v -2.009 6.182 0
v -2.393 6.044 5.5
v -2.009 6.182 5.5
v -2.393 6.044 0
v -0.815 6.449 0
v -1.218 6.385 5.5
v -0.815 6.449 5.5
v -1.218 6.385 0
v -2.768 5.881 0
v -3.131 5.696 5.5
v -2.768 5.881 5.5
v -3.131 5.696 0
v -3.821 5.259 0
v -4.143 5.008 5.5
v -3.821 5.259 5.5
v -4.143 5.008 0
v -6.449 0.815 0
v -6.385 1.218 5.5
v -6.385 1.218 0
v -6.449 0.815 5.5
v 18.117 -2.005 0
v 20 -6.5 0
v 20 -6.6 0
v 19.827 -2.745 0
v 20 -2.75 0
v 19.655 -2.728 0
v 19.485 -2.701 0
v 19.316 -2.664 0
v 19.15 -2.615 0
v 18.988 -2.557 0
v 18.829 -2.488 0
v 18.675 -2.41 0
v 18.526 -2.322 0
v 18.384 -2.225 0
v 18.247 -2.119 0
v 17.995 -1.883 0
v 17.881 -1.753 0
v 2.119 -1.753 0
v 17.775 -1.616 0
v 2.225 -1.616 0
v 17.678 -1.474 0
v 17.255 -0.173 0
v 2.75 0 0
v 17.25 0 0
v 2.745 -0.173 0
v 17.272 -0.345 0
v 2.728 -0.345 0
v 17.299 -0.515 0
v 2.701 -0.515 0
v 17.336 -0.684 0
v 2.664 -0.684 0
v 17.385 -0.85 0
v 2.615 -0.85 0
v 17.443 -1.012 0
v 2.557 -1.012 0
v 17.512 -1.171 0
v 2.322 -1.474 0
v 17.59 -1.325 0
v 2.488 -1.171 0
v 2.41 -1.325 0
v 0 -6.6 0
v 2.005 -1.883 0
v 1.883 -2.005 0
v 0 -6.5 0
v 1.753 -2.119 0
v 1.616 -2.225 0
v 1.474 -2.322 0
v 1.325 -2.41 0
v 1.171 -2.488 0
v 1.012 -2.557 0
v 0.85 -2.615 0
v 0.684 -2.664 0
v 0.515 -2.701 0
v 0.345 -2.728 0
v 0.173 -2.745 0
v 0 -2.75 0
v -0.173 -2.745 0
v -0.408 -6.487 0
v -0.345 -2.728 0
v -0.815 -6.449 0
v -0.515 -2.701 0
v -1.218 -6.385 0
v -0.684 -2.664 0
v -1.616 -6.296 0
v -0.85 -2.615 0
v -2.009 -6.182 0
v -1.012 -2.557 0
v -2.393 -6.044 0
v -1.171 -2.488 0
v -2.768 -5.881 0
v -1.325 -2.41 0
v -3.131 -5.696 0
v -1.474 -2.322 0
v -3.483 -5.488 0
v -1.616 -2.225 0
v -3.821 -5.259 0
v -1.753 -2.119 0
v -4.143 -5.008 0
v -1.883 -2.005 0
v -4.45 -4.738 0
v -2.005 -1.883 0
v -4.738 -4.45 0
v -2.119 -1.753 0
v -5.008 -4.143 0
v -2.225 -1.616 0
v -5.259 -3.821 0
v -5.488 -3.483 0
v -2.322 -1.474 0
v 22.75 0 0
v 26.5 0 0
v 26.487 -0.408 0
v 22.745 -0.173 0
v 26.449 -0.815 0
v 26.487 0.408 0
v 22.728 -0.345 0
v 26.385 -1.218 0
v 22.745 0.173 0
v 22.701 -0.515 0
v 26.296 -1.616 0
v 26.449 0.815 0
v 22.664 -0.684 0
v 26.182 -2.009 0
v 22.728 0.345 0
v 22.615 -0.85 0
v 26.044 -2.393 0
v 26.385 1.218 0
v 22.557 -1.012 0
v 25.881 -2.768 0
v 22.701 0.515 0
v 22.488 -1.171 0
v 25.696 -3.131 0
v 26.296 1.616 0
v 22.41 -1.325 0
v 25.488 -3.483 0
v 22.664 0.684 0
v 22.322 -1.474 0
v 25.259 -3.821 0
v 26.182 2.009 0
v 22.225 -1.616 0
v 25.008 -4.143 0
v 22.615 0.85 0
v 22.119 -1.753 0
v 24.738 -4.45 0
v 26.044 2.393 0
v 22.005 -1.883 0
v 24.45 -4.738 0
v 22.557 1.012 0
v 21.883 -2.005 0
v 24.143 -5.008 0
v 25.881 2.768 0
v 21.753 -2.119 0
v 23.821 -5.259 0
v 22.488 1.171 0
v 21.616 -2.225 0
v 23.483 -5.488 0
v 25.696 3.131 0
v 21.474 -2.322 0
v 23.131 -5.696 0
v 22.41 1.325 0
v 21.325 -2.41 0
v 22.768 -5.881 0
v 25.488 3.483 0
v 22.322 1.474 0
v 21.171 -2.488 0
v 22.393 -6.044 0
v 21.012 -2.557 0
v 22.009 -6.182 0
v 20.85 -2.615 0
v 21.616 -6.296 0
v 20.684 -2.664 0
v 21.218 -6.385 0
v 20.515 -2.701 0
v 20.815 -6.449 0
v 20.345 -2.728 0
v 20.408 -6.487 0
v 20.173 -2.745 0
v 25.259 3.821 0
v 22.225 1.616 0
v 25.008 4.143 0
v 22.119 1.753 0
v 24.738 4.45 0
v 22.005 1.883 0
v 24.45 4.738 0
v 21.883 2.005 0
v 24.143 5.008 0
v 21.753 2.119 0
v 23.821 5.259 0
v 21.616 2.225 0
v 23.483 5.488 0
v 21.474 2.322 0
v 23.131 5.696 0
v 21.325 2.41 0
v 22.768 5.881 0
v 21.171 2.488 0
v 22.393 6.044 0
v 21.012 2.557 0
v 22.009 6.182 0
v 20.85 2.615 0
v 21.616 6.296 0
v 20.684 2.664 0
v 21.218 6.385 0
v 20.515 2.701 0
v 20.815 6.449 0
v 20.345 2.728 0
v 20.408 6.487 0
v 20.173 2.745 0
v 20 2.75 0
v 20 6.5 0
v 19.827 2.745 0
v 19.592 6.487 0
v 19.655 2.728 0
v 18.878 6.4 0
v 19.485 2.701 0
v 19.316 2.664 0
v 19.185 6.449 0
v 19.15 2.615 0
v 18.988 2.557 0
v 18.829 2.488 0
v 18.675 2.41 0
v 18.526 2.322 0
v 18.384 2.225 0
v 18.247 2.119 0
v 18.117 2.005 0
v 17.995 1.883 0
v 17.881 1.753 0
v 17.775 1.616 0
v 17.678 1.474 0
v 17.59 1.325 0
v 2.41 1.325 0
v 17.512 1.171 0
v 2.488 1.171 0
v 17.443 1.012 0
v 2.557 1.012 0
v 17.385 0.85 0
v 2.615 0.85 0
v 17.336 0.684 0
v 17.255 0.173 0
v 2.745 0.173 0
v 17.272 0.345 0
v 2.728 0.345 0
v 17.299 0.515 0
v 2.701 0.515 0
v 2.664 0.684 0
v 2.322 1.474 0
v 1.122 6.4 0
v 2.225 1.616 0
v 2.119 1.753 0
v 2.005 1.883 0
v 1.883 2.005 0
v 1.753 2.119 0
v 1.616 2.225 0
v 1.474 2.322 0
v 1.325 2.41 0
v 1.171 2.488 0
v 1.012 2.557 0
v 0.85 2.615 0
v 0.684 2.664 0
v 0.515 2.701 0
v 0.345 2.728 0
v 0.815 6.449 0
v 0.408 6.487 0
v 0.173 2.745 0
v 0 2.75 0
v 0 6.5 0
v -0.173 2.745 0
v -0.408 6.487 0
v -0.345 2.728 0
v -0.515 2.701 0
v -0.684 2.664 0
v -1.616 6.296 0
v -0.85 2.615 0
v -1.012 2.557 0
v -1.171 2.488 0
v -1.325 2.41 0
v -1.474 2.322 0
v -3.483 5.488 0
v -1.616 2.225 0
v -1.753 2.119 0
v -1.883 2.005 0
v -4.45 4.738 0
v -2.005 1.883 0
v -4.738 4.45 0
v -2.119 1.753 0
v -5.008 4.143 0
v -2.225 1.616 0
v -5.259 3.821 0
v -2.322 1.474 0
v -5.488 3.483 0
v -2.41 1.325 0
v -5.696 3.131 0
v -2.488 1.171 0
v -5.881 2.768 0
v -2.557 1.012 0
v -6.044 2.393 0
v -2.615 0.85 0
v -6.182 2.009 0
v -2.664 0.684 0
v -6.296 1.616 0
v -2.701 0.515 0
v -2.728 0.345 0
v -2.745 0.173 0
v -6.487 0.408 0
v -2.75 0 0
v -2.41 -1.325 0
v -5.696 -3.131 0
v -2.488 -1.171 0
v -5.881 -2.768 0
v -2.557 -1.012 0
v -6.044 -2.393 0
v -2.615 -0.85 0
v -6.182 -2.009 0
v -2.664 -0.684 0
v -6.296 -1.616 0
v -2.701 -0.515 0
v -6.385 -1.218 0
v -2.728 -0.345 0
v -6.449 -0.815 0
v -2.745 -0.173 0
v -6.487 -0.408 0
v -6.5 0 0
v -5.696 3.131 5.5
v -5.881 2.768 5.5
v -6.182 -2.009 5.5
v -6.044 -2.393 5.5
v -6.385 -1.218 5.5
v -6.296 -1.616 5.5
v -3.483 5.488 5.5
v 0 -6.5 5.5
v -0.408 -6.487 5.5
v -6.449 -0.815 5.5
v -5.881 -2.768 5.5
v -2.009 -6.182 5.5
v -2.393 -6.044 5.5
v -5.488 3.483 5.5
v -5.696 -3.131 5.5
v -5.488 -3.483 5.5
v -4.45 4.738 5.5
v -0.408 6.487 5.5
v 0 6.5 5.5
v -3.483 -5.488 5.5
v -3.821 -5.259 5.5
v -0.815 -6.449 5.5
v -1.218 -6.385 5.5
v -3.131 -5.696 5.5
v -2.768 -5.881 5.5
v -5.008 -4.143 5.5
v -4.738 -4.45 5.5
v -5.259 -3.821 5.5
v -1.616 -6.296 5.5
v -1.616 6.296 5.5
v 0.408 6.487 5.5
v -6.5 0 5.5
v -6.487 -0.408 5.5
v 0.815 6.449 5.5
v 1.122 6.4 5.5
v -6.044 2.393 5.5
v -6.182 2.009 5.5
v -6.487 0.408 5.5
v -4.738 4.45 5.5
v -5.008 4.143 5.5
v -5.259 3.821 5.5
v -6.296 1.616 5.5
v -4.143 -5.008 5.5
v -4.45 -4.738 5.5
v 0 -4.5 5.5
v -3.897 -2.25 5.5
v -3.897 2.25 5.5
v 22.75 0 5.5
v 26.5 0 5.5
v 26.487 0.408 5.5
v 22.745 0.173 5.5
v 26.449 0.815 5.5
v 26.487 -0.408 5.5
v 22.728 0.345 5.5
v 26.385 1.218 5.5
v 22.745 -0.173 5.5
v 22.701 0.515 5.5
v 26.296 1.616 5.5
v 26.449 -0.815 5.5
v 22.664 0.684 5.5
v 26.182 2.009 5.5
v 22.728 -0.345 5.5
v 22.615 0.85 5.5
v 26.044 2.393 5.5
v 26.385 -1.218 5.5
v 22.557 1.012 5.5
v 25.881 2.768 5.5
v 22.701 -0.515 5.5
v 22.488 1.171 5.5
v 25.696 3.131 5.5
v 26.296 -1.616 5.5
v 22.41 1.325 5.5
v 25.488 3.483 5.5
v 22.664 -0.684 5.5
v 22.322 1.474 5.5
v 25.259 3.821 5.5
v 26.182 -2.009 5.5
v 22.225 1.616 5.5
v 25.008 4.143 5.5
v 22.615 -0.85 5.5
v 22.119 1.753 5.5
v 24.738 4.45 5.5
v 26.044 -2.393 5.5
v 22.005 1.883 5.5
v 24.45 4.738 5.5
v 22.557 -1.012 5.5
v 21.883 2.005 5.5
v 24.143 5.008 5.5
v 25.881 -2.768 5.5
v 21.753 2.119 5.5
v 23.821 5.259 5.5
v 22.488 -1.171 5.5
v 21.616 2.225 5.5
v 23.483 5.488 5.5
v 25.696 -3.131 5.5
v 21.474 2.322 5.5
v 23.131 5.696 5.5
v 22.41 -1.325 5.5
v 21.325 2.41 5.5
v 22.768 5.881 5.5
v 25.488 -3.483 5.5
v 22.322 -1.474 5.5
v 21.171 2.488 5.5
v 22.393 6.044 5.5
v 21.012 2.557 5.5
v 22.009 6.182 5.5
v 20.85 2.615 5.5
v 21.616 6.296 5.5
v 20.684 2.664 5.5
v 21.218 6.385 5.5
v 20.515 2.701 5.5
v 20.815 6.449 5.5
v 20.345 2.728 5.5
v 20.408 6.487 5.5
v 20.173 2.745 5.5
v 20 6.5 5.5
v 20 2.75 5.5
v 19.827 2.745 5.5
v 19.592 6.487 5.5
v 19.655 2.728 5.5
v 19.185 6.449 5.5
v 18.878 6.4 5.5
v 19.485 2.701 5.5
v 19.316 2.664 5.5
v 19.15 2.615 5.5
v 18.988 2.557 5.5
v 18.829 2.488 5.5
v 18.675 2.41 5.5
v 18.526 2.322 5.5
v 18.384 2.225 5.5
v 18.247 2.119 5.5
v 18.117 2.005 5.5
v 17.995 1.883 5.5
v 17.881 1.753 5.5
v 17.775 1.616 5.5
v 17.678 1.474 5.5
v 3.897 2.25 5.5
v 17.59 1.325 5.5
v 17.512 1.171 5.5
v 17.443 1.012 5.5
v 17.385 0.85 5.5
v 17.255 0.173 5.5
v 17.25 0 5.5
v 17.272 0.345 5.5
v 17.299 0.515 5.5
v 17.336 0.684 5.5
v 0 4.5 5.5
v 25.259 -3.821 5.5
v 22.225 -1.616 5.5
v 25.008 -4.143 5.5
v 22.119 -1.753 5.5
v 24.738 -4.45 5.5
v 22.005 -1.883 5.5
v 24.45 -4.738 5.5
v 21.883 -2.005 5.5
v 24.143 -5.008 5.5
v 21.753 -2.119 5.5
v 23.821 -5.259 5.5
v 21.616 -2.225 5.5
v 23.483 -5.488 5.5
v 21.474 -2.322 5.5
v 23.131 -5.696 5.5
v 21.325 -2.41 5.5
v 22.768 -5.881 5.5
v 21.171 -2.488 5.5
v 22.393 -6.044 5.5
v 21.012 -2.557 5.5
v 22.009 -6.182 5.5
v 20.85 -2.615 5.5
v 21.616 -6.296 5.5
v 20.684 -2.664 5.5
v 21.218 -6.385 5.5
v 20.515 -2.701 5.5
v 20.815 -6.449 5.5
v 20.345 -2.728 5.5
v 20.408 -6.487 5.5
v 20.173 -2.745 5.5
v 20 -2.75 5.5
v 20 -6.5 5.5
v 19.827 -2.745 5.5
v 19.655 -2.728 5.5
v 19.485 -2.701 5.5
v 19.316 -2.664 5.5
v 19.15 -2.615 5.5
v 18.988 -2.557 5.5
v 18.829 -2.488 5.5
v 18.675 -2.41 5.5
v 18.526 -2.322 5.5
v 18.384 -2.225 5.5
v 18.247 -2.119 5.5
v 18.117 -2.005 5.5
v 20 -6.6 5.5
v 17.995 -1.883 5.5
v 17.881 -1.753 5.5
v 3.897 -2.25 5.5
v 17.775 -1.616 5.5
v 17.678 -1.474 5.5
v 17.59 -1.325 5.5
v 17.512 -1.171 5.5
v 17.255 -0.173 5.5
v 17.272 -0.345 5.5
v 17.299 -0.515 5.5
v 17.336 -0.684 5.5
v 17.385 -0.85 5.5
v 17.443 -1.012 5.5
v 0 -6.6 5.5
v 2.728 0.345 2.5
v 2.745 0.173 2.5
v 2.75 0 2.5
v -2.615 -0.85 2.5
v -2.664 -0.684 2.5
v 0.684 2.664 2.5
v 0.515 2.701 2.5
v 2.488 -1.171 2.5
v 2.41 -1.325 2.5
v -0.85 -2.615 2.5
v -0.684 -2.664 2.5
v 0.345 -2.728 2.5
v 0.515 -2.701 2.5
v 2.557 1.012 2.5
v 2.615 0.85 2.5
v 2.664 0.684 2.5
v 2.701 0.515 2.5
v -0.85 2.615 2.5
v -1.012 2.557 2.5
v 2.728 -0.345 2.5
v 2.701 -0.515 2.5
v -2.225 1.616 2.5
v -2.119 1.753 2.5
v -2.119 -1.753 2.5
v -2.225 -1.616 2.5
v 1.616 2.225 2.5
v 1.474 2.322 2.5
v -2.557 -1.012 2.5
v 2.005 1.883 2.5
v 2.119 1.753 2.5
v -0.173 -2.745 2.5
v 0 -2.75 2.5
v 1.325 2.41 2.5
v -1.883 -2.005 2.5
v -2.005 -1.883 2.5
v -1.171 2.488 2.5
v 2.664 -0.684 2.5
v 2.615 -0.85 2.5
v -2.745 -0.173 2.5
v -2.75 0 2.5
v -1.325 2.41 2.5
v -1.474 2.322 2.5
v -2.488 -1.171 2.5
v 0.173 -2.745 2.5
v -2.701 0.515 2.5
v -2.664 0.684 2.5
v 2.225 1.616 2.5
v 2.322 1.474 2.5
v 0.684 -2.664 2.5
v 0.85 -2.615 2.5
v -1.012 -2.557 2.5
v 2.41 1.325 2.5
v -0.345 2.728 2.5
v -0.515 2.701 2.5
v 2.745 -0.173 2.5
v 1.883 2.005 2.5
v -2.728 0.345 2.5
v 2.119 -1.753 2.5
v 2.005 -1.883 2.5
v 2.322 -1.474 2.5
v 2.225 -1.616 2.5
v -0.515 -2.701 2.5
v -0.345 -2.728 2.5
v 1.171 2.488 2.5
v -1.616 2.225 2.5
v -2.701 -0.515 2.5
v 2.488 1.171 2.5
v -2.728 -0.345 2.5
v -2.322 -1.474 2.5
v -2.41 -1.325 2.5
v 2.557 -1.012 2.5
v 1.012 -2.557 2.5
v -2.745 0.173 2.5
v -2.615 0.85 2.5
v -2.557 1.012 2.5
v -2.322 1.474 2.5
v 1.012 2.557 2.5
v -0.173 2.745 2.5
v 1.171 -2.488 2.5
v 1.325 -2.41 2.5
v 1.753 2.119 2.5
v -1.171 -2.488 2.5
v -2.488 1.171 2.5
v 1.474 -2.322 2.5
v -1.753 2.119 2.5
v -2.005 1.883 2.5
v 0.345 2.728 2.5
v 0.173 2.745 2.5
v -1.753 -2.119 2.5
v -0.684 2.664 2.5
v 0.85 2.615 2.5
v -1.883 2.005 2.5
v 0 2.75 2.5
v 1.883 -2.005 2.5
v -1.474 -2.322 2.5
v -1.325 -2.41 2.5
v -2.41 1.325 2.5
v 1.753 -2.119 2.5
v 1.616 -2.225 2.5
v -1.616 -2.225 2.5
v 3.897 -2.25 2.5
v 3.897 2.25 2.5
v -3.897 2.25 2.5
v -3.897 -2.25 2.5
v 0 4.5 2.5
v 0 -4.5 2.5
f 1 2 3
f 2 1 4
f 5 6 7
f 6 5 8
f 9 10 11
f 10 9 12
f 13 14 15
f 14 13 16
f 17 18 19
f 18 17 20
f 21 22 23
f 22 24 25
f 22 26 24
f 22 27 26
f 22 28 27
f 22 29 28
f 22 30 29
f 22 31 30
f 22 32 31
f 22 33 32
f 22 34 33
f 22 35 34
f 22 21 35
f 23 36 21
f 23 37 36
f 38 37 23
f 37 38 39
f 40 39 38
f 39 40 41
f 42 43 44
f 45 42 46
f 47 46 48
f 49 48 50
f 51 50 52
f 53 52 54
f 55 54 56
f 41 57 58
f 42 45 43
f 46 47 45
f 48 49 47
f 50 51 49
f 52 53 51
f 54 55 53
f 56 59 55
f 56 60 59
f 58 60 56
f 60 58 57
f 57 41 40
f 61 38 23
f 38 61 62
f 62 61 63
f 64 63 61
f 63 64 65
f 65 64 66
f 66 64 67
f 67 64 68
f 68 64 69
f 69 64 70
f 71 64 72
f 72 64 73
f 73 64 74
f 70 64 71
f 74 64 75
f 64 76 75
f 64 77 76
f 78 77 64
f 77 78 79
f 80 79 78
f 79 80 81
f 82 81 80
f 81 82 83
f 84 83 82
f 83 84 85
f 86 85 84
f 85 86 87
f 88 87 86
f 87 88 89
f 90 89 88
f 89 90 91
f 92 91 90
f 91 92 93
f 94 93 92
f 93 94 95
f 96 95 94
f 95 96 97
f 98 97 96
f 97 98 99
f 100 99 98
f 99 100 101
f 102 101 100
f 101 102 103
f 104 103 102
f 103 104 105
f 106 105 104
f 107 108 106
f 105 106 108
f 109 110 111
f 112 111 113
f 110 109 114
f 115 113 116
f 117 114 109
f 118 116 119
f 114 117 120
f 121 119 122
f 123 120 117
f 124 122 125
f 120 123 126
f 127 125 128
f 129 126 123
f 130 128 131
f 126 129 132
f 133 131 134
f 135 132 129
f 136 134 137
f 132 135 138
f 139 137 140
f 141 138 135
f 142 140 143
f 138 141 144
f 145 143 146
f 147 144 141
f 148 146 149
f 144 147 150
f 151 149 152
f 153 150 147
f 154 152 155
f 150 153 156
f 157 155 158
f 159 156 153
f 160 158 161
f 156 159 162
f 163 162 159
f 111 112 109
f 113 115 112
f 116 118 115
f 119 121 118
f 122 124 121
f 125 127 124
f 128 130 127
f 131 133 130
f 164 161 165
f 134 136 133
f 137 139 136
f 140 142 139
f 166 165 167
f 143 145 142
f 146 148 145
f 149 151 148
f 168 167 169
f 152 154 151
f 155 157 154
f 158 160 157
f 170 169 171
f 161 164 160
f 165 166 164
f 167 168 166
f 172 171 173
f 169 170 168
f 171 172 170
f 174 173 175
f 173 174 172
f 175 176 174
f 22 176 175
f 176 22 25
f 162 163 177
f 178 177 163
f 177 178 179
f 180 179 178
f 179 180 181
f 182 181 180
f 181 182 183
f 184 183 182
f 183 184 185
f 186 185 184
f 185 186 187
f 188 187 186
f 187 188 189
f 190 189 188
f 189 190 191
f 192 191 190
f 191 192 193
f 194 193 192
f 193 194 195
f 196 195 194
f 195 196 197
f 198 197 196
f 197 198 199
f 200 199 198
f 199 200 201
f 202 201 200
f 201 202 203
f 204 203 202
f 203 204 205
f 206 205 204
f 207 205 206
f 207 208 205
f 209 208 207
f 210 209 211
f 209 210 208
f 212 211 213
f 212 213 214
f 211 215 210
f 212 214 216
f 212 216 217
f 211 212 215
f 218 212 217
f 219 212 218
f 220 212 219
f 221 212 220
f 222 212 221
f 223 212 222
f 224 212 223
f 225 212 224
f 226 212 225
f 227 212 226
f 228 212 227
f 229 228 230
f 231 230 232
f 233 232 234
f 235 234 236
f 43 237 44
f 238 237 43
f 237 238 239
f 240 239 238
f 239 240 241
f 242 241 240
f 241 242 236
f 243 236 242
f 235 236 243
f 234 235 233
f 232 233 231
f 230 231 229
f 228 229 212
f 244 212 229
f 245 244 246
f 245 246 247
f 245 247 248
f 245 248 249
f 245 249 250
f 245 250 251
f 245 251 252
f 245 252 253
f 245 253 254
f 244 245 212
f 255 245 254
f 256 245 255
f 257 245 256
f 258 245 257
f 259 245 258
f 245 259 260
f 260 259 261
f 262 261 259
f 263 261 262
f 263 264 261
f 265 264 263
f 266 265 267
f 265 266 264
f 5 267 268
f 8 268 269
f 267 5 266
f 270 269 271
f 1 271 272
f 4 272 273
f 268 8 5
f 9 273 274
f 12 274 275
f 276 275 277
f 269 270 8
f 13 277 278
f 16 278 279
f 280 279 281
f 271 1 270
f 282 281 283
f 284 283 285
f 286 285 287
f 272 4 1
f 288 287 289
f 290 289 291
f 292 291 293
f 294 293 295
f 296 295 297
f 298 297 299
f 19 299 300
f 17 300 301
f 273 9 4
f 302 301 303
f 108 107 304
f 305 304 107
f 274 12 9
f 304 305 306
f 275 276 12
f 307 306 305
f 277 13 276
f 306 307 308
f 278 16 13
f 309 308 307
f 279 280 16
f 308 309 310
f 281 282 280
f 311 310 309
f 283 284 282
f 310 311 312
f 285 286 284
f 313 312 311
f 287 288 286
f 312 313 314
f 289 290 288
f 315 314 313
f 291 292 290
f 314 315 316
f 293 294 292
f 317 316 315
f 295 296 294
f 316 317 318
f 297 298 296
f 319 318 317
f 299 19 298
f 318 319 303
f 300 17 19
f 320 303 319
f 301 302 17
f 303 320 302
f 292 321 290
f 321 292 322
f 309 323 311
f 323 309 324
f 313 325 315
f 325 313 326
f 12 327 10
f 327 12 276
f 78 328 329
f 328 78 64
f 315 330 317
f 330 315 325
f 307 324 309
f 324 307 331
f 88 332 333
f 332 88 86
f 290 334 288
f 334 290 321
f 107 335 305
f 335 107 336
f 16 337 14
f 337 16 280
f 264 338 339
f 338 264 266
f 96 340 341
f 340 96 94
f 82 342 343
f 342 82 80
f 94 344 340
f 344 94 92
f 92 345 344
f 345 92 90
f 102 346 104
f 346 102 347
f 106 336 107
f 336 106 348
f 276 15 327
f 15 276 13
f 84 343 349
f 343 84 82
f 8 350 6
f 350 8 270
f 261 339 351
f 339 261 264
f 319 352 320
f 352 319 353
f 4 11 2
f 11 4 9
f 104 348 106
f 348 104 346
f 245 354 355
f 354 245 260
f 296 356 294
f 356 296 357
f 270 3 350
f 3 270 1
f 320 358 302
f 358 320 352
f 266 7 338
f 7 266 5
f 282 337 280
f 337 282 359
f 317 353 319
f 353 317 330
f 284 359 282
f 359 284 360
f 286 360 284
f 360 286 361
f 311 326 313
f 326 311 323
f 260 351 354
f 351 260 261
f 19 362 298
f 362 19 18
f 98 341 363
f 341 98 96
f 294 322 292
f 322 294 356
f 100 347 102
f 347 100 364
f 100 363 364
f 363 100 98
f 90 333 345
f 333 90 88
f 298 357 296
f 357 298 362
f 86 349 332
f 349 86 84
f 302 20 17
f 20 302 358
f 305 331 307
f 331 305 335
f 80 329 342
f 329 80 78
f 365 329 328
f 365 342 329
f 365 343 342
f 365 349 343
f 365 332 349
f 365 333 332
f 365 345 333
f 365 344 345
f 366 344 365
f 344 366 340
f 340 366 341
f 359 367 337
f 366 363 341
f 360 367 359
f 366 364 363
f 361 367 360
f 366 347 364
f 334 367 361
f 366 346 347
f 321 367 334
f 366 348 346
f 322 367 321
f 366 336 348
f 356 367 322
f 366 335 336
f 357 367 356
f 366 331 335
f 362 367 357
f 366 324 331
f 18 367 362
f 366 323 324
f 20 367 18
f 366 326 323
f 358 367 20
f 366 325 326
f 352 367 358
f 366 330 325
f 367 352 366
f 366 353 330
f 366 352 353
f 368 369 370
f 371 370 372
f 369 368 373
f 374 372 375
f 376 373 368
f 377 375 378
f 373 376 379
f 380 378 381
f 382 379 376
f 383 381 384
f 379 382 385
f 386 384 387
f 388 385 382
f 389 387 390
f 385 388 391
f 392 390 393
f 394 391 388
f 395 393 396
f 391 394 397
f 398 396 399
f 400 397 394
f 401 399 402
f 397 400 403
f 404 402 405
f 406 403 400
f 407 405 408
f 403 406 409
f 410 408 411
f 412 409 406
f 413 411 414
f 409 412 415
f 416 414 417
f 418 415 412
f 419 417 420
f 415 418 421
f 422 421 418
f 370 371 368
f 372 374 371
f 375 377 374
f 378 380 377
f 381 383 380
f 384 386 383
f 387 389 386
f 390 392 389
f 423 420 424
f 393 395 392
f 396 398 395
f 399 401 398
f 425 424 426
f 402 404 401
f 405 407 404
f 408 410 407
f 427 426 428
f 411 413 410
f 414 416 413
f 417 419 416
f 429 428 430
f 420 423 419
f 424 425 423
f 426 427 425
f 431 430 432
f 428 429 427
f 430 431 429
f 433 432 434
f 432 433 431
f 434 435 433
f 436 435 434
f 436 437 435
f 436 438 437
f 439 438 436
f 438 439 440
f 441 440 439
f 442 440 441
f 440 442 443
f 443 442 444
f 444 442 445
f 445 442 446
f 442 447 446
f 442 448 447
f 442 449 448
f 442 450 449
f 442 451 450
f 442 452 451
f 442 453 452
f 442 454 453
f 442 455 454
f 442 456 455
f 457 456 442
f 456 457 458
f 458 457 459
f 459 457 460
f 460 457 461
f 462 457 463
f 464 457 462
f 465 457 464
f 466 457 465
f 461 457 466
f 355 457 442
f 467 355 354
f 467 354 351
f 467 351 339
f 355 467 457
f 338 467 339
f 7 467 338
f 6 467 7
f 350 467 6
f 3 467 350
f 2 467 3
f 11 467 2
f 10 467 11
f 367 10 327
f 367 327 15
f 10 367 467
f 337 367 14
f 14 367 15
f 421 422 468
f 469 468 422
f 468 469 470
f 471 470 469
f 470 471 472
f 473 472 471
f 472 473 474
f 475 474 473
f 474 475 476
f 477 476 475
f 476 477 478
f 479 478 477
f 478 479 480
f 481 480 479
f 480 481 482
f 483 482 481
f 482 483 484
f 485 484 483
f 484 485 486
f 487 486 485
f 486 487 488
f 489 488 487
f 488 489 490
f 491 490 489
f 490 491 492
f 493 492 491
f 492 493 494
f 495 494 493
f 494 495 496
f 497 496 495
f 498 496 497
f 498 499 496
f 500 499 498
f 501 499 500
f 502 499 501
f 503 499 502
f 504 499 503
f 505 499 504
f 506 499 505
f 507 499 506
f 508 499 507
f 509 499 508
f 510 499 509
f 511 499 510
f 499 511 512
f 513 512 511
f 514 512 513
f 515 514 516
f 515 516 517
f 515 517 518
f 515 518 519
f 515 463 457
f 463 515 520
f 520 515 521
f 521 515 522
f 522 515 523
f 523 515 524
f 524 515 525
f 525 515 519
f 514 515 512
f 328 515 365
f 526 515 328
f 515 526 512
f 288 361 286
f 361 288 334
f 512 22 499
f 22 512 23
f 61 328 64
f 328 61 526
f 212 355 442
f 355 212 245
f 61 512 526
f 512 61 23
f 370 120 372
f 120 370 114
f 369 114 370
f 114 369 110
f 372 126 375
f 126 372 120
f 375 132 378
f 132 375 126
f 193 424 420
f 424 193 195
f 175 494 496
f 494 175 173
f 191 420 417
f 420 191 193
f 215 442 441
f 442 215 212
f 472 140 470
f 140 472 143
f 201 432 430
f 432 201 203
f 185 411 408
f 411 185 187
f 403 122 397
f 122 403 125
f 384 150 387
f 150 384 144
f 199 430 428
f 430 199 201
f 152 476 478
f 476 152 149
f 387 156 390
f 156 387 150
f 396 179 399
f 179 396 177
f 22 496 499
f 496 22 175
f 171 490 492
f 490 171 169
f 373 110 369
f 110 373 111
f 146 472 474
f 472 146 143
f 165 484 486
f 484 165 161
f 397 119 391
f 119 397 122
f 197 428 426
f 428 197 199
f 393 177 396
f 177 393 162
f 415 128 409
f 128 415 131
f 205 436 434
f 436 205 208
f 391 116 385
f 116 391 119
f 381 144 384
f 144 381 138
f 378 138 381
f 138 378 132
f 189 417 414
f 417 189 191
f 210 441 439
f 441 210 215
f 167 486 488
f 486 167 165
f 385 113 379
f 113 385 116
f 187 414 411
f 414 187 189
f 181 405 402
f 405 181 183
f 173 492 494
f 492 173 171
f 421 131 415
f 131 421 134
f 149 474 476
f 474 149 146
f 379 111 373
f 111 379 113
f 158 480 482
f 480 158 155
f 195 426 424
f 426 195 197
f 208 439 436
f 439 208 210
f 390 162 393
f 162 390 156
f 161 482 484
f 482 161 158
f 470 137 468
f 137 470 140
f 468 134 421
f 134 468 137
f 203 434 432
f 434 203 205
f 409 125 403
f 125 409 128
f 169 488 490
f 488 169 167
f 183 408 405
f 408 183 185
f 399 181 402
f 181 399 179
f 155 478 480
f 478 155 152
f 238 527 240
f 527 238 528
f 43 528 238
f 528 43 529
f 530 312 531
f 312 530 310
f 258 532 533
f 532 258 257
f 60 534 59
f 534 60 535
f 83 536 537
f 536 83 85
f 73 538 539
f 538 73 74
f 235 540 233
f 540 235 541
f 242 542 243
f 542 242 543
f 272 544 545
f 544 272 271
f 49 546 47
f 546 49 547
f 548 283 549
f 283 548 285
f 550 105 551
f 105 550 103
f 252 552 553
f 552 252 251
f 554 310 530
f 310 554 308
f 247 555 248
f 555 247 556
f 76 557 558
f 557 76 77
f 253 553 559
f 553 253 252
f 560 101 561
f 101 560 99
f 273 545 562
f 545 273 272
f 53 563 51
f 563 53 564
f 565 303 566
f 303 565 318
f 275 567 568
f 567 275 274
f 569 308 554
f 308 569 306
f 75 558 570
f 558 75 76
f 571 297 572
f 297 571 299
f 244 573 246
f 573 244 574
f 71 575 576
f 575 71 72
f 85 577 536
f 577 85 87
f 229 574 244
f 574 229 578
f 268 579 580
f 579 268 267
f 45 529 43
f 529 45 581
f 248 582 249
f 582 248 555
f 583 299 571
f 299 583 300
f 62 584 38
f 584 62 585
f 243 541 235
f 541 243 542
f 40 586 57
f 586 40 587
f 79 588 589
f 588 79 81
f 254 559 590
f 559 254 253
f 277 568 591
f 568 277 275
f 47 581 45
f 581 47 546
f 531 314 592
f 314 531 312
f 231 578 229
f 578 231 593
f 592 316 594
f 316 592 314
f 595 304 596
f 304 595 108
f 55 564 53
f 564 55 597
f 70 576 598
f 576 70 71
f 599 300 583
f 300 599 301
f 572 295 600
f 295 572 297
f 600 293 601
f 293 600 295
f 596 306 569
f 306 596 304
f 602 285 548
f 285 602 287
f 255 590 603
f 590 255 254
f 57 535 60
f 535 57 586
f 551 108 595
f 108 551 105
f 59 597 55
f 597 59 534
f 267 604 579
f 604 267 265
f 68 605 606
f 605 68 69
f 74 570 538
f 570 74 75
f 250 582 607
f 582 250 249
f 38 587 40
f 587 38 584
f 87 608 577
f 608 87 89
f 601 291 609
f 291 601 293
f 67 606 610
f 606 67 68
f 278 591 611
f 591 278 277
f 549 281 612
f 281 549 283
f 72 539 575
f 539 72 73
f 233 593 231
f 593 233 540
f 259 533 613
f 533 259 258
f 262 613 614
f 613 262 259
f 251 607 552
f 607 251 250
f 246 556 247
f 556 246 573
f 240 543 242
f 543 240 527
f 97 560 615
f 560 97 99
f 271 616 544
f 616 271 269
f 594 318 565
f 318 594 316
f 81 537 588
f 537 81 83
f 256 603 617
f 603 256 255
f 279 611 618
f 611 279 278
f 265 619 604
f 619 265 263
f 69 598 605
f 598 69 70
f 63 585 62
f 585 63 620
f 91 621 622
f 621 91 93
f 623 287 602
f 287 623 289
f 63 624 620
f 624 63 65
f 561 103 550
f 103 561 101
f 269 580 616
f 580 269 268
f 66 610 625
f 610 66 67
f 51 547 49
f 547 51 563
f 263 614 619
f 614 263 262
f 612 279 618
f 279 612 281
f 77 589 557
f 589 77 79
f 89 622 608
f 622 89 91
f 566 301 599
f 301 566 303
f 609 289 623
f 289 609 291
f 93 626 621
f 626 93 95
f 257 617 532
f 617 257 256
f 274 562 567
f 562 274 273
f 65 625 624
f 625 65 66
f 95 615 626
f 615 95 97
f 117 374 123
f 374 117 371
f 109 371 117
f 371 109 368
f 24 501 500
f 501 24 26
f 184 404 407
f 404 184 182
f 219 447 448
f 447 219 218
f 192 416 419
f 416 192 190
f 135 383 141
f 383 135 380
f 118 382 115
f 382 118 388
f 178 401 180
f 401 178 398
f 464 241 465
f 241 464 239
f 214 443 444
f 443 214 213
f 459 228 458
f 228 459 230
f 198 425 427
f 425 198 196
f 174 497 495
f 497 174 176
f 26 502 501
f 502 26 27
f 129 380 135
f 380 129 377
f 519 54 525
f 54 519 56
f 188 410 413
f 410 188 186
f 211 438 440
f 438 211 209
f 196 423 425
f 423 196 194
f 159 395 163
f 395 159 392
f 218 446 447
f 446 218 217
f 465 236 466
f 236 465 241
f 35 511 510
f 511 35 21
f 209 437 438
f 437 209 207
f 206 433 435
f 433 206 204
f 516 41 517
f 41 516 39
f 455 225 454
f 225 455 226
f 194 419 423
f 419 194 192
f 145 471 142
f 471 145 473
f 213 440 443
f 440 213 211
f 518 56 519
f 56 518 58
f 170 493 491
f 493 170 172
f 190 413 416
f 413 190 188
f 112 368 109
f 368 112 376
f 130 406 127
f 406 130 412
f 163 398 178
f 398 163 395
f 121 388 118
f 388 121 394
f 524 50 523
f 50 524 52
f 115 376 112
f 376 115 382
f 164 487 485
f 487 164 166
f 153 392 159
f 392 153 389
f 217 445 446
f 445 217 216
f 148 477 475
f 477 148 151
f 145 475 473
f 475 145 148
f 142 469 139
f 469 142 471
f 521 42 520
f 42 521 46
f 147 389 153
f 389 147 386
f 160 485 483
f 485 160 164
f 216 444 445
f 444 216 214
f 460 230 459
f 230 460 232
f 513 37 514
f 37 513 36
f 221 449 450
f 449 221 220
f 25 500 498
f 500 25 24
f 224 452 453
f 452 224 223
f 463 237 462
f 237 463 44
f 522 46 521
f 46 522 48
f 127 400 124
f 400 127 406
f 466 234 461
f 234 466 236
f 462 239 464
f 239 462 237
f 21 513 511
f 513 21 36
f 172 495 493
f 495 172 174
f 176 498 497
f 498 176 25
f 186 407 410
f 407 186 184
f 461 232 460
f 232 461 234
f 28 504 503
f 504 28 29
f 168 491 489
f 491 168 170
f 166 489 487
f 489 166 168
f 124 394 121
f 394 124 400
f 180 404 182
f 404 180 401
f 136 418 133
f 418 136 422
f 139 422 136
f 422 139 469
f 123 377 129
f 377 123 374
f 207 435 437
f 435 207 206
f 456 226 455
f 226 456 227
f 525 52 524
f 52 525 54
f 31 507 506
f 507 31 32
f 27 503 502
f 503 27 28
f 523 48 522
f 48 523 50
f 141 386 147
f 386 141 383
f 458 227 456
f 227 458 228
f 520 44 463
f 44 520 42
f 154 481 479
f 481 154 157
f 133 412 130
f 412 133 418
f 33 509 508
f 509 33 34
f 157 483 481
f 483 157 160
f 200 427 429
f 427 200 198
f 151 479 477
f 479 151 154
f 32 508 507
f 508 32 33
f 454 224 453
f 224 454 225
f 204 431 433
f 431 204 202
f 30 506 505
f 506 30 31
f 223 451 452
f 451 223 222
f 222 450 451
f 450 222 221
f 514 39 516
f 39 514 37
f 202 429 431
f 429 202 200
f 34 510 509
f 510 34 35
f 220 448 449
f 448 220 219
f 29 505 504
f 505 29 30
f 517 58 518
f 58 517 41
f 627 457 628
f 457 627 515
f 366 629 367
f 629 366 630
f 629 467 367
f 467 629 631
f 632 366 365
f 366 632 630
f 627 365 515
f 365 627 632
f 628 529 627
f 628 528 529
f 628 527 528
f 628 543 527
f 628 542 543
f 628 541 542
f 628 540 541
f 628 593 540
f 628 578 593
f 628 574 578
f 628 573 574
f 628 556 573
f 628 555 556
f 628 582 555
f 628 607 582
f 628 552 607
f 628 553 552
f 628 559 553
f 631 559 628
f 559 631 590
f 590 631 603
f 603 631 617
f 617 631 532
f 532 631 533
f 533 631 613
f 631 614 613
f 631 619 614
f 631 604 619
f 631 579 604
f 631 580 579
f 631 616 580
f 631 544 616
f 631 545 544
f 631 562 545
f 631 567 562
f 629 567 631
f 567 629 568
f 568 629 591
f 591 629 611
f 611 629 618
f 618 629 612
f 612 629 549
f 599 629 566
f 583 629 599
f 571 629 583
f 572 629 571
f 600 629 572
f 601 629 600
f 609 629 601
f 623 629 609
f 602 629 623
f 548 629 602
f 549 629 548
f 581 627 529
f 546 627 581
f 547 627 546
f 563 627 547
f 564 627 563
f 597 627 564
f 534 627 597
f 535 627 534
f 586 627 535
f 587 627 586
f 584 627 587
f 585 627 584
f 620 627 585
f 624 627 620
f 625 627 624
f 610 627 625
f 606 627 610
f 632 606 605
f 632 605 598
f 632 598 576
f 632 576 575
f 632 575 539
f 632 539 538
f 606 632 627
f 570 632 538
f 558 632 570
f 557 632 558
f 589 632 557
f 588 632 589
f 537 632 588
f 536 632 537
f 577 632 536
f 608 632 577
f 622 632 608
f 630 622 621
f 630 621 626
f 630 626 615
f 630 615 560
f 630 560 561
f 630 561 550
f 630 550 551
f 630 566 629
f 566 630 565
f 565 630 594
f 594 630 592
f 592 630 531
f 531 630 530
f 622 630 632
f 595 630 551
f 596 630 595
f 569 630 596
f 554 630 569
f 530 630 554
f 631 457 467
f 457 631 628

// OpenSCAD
$fn = 100;

length = 20;

difference(){
	union(){
		cylinder(h=5.5, d=13);
		translate([0,-6.6,0])cube([length,13,5.5]);
		translate([length,0,0])cylinder(h=5.5, d=13);
	}
	cylinder(h=5.5, d=5.5);
	translate([length,0,0])cylinder(h=5.5, d=5.5);
	translate([0,0,2.5])rotate(90)cylinder(h=5.5, d=9, $fn=6);
}
